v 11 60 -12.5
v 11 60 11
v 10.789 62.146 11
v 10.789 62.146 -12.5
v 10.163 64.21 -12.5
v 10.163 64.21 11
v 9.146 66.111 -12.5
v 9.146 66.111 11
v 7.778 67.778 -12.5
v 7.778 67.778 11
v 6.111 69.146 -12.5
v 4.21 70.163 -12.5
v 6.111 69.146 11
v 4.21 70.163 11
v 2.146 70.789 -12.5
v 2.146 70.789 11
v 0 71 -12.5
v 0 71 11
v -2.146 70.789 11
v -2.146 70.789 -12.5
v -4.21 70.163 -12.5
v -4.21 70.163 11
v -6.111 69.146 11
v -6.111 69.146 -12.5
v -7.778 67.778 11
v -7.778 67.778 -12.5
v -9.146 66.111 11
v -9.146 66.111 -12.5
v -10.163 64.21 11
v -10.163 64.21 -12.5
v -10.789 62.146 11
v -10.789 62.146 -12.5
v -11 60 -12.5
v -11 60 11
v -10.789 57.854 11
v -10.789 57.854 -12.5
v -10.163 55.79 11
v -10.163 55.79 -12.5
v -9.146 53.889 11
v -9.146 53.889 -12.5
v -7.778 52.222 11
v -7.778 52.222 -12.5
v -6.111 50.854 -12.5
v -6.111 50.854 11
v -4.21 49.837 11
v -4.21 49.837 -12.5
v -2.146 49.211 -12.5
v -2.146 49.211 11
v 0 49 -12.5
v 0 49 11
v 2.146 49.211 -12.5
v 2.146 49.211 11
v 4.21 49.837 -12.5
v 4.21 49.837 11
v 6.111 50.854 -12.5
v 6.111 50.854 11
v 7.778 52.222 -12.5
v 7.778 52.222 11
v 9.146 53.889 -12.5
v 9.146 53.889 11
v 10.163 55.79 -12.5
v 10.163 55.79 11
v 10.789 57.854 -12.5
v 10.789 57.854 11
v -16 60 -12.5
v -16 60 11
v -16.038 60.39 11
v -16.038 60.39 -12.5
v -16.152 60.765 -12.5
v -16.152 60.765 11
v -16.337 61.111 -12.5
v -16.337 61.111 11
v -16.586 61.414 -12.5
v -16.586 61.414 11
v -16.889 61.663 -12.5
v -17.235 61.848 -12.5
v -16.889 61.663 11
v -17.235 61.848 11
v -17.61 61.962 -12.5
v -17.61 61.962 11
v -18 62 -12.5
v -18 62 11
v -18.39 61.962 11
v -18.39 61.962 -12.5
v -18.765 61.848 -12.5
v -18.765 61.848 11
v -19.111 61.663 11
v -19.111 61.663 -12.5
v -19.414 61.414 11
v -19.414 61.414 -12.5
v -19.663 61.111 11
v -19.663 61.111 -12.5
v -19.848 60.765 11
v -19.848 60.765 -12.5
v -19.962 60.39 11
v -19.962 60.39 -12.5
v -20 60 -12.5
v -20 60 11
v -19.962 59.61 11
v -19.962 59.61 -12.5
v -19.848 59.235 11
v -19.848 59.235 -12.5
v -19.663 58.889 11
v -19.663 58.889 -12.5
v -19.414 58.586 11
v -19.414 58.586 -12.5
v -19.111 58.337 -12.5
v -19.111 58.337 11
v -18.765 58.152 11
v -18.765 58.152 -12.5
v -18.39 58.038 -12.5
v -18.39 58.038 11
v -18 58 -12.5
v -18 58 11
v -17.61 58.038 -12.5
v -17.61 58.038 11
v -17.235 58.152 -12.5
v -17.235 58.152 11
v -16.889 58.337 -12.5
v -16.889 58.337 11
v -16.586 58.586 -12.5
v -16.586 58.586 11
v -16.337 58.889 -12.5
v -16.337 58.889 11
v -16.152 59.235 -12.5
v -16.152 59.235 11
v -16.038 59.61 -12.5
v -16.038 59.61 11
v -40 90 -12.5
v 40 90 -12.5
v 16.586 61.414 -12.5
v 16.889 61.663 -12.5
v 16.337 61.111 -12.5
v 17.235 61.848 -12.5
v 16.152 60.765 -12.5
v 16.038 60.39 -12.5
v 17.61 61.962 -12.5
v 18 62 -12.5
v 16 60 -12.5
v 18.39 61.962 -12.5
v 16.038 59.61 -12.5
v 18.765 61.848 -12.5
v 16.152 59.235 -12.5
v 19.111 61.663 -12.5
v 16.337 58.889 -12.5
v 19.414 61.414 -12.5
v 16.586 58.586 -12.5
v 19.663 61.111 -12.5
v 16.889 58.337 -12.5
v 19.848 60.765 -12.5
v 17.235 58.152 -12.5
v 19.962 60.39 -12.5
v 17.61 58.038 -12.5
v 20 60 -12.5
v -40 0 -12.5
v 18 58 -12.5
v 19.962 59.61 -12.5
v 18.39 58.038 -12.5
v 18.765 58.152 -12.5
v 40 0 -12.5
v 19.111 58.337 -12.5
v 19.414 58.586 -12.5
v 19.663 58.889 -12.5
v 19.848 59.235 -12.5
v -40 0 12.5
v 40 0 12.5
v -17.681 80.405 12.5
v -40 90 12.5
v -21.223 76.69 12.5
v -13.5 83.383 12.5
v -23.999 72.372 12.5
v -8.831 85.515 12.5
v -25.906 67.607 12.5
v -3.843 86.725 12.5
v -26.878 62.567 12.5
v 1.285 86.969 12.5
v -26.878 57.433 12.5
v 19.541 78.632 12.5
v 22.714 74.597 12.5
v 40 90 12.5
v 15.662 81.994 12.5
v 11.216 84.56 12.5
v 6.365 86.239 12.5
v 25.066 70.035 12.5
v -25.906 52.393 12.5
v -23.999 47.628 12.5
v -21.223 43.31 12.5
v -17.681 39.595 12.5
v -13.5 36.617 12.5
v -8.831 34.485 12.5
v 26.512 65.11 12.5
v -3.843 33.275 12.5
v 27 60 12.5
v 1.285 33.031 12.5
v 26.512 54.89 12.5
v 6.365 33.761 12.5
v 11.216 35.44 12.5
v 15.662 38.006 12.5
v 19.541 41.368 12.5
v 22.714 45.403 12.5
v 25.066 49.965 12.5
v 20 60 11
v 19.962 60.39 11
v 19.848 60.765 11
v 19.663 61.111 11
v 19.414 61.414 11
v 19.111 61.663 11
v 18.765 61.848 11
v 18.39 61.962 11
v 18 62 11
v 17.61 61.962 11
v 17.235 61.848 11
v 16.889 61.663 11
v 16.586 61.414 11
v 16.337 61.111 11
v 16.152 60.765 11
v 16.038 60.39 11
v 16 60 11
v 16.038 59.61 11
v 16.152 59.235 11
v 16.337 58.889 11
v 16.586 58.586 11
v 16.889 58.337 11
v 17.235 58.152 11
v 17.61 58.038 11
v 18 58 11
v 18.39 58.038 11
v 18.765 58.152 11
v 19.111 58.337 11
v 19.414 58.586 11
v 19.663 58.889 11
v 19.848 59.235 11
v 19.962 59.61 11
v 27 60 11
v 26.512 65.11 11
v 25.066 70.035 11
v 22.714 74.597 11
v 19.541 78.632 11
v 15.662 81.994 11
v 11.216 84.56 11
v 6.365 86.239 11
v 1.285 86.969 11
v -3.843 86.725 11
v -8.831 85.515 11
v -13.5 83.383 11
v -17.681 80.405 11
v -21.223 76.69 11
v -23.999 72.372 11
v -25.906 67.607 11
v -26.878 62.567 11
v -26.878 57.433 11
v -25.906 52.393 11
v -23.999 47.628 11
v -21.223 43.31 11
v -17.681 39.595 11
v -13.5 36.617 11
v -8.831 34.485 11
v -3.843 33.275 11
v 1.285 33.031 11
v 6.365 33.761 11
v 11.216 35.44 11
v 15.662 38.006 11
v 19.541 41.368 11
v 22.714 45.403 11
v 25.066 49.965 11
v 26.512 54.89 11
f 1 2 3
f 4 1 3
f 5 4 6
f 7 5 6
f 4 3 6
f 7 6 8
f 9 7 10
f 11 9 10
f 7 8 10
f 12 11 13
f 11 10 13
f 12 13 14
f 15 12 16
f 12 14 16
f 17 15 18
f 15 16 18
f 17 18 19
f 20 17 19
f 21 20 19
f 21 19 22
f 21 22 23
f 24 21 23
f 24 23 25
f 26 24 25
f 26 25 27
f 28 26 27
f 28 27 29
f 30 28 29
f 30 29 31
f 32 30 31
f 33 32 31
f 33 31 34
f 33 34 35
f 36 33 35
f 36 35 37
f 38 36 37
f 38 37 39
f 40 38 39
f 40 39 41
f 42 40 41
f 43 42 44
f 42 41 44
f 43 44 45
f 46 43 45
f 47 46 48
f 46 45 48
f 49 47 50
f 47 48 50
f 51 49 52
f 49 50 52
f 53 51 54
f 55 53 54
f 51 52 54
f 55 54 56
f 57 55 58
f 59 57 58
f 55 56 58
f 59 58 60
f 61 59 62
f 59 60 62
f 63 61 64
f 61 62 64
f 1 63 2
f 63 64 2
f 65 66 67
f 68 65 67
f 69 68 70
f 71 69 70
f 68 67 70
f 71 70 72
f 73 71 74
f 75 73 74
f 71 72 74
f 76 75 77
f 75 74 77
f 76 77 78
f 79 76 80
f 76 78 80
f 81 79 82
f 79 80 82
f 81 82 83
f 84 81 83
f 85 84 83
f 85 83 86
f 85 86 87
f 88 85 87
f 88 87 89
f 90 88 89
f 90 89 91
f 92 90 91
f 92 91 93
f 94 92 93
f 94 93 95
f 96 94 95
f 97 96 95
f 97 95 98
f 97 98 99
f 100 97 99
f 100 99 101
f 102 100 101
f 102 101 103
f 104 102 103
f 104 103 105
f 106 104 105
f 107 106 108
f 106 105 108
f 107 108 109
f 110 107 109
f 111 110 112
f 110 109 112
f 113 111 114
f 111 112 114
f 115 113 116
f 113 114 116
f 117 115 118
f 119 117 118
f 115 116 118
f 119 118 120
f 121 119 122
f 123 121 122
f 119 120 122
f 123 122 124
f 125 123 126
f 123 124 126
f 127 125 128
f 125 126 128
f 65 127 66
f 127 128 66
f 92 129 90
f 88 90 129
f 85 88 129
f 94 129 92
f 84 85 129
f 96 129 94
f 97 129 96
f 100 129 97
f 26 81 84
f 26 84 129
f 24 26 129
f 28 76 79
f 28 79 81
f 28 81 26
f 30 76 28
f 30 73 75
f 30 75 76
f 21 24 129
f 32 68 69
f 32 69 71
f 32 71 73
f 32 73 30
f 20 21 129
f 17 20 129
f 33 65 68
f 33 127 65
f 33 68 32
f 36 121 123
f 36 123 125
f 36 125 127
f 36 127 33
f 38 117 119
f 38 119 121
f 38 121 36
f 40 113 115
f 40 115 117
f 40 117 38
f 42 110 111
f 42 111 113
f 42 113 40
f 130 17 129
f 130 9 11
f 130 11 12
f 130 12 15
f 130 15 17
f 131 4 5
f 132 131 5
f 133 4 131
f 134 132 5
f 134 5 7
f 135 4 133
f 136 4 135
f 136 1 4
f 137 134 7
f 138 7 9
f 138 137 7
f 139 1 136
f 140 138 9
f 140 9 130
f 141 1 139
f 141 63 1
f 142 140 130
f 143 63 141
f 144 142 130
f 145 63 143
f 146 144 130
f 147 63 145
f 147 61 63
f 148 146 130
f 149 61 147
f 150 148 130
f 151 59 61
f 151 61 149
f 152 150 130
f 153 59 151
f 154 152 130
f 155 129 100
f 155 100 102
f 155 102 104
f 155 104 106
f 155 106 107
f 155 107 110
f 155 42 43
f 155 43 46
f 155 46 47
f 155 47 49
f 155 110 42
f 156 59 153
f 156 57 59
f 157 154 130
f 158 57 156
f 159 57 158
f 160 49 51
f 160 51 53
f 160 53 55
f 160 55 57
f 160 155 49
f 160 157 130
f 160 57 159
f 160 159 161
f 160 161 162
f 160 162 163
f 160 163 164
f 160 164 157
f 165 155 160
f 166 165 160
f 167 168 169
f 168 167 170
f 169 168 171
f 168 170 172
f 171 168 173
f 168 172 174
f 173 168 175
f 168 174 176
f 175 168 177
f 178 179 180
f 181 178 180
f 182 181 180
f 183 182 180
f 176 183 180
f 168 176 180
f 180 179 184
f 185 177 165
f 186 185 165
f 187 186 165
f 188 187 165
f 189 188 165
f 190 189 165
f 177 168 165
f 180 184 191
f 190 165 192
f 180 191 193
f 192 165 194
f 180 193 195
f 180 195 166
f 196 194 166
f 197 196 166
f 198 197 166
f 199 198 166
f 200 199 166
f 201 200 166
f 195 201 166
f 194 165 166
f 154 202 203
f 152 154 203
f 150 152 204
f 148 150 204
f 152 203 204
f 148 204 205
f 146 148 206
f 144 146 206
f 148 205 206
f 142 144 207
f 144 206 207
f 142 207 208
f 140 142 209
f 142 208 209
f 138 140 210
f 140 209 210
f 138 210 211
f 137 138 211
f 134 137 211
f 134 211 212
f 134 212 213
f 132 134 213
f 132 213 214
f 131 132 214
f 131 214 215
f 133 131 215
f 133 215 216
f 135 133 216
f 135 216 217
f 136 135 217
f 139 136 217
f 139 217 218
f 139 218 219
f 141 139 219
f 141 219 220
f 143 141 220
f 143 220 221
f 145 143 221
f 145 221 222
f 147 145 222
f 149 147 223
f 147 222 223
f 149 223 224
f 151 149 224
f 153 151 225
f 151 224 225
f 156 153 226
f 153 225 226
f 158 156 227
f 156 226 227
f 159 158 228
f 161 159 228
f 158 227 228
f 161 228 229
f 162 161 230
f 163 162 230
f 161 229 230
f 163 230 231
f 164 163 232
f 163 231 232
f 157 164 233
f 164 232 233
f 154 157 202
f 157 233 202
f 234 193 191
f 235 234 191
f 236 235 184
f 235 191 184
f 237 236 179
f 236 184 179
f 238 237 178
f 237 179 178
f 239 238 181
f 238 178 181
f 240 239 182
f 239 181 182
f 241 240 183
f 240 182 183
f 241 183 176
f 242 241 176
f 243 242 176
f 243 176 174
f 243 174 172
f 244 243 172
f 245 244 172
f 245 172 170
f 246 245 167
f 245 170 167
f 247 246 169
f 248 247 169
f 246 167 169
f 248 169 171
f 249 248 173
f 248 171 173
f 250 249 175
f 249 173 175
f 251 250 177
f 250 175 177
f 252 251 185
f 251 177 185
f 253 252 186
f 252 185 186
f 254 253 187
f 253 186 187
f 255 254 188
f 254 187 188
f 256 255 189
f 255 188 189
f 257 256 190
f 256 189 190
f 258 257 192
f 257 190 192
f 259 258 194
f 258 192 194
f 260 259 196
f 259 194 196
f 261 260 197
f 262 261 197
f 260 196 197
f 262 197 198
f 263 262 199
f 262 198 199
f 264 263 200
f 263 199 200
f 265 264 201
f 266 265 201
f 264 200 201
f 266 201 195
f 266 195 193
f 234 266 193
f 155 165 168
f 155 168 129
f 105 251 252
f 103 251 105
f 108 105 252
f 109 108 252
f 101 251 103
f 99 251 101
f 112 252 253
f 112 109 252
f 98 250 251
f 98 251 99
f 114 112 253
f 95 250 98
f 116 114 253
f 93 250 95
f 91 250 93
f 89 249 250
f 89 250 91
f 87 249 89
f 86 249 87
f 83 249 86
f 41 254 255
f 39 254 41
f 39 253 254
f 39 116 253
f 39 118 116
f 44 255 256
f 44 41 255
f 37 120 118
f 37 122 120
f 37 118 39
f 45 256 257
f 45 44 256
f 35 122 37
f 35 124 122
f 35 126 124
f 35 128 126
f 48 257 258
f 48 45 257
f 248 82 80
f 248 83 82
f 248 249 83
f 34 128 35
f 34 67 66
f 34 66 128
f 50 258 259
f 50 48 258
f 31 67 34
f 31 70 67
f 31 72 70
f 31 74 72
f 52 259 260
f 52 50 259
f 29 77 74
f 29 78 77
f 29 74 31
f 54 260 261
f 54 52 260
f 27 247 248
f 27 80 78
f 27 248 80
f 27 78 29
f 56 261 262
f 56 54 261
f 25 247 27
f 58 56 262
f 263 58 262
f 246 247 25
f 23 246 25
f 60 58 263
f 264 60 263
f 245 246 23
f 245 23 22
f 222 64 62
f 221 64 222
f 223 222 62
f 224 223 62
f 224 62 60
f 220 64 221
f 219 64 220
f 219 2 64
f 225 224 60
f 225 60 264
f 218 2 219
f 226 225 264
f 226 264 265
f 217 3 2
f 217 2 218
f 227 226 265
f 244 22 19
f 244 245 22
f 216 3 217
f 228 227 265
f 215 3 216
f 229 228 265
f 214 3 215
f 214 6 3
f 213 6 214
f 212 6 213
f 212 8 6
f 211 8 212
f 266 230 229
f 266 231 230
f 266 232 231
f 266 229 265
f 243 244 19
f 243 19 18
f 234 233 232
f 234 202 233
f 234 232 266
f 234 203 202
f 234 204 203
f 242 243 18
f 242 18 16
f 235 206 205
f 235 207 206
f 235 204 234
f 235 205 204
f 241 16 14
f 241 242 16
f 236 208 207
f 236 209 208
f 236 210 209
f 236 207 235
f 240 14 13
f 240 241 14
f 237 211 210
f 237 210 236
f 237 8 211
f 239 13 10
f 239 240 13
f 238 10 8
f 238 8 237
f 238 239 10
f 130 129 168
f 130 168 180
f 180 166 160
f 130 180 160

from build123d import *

# Parameters (mm, degrees)
SKETCH_5_W          = 80
SKETCH_5_H          = 25
EXTRUDE_4_DEPTH     = 90
SKETCH_6_R          = 2
SKETCH_6_R_2        = 11
CUT_EXTRUDE_1_DEPTH = 90
SKETCH_6_3_R        = 27
SKETCH_6_3_R_2      = 2
SKETCH_6_3_R_3      = 11
CUT_EXTRUDE_2_DEPTH = 1.5


with BuildPart() as part:
    # 草图5 → 凸台-拉伸4 (new body)
    with BuildSketch(Plane(origin=(0, 0, 0), x_dir=(1, 0, 0), z_dir=(0, 1, 0))):
        Rectangle(SKETCH_5_W, SKETCH_5_H)
    extrude(amount=EXTRUDE_4_DEPTH)

    # 草图6 → 切除-拉伸1 (cut)
    with BuildSketch(Plane.XY.offset(12.5)):
        with Locations((-18, 60)):
            Circle(SKETCH_6_R)
        with Locations((0, 60)):
            Circle(SKETCH_6_R_2)
        with Locations((18, 60)):
            Circle(SKETCH_6_R)
    extrude(amount=-CUT_EXTRUDE_1_DEPTH, mode=Mode.SUBTRACT)

    # 草图6<3> → 切除-拉伸2 (cut)
    with BuildSketch(Plane.XY.offset(12.5)):
        with Locations((0, 60)):
            Circle(SKETCH_6_3_R)
        with Locations((-18, 60)):
            Circle(SKETCH_6_3_R_2, mode=Mode.SUBTRACT)
        with Locations((0, 60)):
            Circle(SKETCH_6_3_R_3, mode=Mode.SUBTRACT)
        with Locations((18, 60)):
            Circle(SKETCH_6_3_R_2, mode=Mode.SUBTRACT)
    extrude(amount=-CUT_EXTRUDE_2_DEPTH, mode=Mode.SUBTRACT)


solid = part.part
